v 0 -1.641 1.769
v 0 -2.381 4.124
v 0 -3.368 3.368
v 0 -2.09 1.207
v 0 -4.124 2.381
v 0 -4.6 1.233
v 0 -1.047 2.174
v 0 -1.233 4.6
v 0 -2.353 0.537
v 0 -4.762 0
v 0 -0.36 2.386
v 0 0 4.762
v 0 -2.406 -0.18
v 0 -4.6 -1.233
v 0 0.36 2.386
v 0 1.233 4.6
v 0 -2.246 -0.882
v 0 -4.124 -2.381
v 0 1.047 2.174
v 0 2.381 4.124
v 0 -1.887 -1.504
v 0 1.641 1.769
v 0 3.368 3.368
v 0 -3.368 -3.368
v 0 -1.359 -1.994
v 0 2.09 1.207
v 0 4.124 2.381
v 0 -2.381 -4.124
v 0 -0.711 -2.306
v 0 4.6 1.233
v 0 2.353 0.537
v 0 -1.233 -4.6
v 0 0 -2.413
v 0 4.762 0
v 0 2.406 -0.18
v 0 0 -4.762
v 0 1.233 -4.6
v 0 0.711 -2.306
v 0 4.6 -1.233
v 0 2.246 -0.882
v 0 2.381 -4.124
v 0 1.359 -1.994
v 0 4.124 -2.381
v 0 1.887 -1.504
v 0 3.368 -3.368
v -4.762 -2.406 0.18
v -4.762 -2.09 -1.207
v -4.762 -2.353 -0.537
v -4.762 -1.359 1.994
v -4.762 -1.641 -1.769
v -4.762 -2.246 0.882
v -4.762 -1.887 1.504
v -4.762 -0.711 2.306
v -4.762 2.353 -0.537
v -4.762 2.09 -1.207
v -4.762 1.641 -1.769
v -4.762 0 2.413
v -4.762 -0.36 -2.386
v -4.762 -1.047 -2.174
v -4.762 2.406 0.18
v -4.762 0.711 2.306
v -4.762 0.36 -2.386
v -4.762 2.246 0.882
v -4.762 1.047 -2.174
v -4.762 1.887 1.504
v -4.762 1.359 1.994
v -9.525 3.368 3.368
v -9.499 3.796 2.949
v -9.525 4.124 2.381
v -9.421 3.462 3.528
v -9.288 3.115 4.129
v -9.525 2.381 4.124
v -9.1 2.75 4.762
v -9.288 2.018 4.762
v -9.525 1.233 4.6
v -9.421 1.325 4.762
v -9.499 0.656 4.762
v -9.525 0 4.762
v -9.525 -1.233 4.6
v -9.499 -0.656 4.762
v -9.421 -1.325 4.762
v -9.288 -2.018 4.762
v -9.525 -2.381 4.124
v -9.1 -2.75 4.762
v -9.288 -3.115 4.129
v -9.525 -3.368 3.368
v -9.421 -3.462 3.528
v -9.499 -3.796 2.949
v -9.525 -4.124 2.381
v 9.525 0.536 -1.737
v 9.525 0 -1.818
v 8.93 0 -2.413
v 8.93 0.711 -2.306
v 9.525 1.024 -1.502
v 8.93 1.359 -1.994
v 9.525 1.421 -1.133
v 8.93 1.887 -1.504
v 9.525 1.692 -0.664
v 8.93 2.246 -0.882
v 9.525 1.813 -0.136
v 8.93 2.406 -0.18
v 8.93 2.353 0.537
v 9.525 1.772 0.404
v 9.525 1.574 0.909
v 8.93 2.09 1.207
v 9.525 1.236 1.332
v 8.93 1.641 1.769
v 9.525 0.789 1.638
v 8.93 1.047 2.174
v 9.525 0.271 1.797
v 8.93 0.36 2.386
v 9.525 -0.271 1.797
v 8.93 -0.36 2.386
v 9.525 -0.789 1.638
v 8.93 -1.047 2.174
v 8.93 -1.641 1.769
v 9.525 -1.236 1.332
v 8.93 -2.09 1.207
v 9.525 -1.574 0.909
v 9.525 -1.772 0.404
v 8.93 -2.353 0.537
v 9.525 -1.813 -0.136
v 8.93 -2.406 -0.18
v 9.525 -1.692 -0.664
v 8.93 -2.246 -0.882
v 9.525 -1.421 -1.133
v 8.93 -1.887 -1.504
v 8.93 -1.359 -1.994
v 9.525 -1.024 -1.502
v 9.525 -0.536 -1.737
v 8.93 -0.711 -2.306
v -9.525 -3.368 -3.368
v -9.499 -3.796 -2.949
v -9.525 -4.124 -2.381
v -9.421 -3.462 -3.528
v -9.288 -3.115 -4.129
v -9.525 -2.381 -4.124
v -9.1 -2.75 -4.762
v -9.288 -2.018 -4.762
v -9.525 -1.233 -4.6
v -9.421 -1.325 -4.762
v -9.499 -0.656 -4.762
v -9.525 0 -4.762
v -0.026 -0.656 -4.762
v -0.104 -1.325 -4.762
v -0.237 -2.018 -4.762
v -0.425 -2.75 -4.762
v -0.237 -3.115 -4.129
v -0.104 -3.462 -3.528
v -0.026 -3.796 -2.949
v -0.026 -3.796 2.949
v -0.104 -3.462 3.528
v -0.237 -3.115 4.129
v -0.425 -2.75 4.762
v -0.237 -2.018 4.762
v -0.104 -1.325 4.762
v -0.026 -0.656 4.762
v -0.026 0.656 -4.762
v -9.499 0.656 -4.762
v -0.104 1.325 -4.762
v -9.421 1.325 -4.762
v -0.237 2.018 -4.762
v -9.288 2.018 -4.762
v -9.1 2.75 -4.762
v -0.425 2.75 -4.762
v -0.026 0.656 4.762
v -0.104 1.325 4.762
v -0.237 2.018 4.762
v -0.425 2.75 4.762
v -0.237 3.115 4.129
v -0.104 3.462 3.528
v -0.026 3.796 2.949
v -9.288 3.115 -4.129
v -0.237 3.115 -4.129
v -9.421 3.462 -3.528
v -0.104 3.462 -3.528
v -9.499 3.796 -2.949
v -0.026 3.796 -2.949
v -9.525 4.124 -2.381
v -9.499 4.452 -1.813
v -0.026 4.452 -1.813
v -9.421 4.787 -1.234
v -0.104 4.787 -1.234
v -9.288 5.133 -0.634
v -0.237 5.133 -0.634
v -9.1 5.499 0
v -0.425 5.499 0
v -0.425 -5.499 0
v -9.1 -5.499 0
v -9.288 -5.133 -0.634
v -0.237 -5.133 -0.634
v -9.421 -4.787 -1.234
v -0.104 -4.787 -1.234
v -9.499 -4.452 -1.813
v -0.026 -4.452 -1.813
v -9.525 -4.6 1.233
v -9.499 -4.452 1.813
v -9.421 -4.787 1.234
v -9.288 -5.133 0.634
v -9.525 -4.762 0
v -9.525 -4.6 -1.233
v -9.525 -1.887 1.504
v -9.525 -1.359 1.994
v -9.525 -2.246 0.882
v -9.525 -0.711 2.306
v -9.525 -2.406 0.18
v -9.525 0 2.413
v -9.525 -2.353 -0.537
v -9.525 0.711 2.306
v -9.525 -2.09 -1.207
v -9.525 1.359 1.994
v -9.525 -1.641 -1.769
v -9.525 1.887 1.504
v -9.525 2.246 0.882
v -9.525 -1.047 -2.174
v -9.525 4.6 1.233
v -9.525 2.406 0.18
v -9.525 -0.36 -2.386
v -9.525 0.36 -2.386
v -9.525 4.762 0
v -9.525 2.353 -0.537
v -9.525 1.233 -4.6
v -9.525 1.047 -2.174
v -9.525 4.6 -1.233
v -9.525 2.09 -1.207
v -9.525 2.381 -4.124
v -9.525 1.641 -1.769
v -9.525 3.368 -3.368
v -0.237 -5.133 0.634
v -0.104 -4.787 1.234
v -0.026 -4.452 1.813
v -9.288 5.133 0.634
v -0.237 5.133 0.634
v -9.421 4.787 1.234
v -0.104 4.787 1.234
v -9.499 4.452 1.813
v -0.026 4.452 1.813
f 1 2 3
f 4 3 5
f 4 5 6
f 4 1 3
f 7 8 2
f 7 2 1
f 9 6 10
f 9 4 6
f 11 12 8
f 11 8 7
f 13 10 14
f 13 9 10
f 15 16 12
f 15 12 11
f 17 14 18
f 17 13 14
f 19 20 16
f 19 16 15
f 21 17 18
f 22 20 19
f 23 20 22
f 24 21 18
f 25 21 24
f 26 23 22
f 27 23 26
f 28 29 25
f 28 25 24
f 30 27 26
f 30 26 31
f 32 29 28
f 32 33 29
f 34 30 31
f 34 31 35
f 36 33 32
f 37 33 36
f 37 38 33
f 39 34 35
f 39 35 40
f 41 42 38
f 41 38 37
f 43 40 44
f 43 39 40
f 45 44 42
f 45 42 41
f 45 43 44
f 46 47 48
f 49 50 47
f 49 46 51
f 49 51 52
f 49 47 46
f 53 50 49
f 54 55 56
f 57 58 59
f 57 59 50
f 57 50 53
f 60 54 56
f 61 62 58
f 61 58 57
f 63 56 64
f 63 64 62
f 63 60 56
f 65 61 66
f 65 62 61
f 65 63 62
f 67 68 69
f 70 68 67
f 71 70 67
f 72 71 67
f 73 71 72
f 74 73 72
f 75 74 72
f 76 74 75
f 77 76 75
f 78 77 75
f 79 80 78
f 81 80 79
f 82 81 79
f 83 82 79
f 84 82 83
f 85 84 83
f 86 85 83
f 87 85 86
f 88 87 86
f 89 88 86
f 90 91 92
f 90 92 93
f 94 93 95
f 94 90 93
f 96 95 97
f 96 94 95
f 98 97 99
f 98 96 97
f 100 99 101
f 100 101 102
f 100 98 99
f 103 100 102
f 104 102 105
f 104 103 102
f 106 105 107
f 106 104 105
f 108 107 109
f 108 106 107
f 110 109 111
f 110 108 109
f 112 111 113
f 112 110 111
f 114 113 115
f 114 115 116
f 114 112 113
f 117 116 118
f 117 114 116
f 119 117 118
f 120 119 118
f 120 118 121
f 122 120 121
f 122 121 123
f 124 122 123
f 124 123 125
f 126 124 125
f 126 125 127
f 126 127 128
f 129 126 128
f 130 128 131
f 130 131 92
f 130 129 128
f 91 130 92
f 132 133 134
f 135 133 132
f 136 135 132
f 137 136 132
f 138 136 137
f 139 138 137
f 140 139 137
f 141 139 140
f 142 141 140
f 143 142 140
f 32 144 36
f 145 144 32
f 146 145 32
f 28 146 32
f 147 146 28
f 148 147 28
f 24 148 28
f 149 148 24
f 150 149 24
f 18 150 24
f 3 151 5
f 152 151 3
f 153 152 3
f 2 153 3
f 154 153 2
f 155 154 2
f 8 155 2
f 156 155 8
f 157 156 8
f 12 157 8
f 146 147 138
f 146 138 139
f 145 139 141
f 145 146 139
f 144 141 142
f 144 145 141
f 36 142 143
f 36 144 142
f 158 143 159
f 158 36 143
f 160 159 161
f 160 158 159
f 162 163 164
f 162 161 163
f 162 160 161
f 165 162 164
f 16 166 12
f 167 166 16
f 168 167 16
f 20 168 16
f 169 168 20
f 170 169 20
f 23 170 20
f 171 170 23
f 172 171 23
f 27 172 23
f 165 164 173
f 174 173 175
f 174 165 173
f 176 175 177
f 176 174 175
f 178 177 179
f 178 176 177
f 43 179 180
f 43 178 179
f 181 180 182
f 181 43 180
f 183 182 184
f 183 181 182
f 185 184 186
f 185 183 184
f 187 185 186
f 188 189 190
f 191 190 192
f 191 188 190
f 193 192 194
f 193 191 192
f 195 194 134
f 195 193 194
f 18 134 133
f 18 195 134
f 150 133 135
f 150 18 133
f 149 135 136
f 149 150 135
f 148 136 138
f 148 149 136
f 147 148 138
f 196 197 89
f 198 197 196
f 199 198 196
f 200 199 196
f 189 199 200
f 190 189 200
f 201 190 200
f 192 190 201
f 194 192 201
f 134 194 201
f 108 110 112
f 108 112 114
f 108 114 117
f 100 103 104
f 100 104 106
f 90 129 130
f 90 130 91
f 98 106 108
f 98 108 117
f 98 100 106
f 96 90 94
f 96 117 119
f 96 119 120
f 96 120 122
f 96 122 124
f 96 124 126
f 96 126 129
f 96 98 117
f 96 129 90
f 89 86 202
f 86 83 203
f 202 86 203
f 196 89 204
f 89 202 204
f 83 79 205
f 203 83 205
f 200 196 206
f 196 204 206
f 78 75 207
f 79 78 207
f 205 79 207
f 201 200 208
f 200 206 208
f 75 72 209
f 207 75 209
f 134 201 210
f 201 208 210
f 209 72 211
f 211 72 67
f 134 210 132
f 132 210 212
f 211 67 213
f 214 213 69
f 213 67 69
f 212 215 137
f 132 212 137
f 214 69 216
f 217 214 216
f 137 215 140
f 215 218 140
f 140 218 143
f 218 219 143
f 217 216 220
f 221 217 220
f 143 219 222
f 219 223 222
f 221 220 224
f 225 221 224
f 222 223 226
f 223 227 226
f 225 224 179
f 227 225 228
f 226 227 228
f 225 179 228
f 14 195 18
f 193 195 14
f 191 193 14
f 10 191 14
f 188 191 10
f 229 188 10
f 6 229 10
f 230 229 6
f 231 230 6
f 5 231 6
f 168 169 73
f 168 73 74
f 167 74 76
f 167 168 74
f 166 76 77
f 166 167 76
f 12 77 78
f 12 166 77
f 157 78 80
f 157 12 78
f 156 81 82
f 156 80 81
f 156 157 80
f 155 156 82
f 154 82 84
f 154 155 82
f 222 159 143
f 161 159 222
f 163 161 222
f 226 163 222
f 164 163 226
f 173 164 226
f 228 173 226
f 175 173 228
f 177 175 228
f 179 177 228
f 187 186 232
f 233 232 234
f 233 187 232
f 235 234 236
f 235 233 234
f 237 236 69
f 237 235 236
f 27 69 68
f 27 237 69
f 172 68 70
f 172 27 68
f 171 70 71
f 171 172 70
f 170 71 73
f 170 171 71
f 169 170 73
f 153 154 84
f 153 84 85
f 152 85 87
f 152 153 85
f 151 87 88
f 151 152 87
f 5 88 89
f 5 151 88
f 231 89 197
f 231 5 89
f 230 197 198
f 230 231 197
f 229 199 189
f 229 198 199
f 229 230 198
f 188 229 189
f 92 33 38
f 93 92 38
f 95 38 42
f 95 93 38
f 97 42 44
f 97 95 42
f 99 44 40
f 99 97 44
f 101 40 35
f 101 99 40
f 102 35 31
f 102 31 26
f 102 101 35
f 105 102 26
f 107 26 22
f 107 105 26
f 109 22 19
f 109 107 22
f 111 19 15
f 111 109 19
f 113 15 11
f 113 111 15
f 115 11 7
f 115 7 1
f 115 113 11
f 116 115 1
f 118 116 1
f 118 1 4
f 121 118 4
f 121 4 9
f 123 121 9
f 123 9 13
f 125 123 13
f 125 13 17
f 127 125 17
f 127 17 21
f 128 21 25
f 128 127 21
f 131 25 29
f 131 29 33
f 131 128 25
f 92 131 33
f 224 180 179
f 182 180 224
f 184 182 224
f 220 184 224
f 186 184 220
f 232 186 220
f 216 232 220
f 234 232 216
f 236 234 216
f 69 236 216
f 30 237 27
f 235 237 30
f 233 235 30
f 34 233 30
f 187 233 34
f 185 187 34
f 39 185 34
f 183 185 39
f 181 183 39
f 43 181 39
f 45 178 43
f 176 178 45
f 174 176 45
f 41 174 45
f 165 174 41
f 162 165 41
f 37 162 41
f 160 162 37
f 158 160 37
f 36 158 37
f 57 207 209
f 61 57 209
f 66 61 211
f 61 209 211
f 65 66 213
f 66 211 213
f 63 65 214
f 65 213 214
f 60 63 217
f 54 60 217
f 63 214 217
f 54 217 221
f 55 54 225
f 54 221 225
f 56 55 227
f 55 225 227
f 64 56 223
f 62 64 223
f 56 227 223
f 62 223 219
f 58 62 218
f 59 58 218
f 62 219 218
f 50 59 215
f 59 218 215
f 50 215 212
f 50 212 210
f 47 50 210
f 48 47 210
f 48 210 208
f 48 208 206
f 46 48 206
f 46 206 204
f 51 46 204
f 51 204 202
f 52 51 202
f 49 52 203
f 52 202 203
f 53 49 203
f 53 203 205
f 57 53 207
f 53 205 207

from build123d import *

# Parameters (mm, degrees)
SKETCH2_R         = 2.413
EXTRUDE1_DEPTH    = 9.525
CHAMFER1_SIZE     = 0.5953125
EXTRUDE4_DEPTH    = 9.525
SKETCH8_OUTSIDE_W = 85.776
SKETCH8_OUTSIDE_H = 87.248
SKETCH8_OUTSIDE_R = 4.7625
EXTRUDE5_DEPTH    = 20.05
EXTRUDE5_TAPER    = 60
SKETCH9_OUTSIDE_W = 52.78
SKETCH9_OUTSIDE_H = 54.252
SKETCH9_OUTSIDE_R = 4.7625
EXTRUDE6_DEPTH    = 10.525
EXTRUDE6_TAPER    = 60
SKETCH10_R        = 2.413
EXTRUDE7_DEPTH    = 4.7625


with BuildPart() as part:
    # Sketch2 → Extrude1 (new body)
    with BuildSketch(Plane(origin=(9.525, 0, 0), x_dir=(0, 0, -1), z_dir=(1, 0, 0))):
        Circle(SKETCH2_R)
    extrude(amount=-EXTRUDE1_DEPTH)

    # Chamfer1
    chamfer1_edges = [part.edges().sort_by_distance(p)[0] for p in [
        (9.525, 0, 2.413),
    ]]
    chamfer(chamfer1_edges, length=CHAMFER1_SIZE)

    # Sketch7 → Extrude4 (add)
    with BuildSketch(Plane(origin=(0, 0, 0), x_dir=(0, 0, -1), z_dir=(1, 0, 0))):
        Polygon((0, 5.499261314), (-4.7625, 2.749630657), (-4.7625, -2.749630657), (0, -5.499261314), (4.7625, -2.749630657), (4.7625, 2.749630657), align=None)
    extrude(amount=-EXTRUDE4_DEPTH)

    # Sketch8 outside → Extrude5 (cut, through all)
    with BuildSketch(Plane.ZY.offset(9.525)):
        Rectangle(SKETCH8_OUTSIDE_W, SKETCH8_OUTSIDE_H)
        Circle(SKETCH8_OUTSIDE_R, mode=Mode.SUBTRACT)
    extrude(amount=-EXTRUDE5_DEPTH, taper=EXTRUDE5_TAPER, mode=Mode.SUBTRACT)

    # Sketch9 outside → Extrude6 (cut, through all)
    with BuildSketch(Plane(origin=(0, 0, 0), x_dir=(0, 0, -1), z_dir=(1, 0, 0))):
        Rectangle(SKETCH9_OUTSIDE_W, SKETCH9_OUTSIDE_H)
        Circle(SKETCH9_OUTSIDE_R, mode=Mode.SUBTRACT)
    extrude(amount=-EXTRUDE6_DEPTH, taper=EXTRUDE6_TAPER, mode=Mode.SUBTRACT)

    # Sketch10 → Extrude7 (cut)
    with BuildSketch(Plane.ZY.offset(9.525)):
        Circle(SKETCH10_R)
    extrude(amount=-EXTRUDE7_DEPTH, mode=Mode.SUBTRACT)


solid = part.part
